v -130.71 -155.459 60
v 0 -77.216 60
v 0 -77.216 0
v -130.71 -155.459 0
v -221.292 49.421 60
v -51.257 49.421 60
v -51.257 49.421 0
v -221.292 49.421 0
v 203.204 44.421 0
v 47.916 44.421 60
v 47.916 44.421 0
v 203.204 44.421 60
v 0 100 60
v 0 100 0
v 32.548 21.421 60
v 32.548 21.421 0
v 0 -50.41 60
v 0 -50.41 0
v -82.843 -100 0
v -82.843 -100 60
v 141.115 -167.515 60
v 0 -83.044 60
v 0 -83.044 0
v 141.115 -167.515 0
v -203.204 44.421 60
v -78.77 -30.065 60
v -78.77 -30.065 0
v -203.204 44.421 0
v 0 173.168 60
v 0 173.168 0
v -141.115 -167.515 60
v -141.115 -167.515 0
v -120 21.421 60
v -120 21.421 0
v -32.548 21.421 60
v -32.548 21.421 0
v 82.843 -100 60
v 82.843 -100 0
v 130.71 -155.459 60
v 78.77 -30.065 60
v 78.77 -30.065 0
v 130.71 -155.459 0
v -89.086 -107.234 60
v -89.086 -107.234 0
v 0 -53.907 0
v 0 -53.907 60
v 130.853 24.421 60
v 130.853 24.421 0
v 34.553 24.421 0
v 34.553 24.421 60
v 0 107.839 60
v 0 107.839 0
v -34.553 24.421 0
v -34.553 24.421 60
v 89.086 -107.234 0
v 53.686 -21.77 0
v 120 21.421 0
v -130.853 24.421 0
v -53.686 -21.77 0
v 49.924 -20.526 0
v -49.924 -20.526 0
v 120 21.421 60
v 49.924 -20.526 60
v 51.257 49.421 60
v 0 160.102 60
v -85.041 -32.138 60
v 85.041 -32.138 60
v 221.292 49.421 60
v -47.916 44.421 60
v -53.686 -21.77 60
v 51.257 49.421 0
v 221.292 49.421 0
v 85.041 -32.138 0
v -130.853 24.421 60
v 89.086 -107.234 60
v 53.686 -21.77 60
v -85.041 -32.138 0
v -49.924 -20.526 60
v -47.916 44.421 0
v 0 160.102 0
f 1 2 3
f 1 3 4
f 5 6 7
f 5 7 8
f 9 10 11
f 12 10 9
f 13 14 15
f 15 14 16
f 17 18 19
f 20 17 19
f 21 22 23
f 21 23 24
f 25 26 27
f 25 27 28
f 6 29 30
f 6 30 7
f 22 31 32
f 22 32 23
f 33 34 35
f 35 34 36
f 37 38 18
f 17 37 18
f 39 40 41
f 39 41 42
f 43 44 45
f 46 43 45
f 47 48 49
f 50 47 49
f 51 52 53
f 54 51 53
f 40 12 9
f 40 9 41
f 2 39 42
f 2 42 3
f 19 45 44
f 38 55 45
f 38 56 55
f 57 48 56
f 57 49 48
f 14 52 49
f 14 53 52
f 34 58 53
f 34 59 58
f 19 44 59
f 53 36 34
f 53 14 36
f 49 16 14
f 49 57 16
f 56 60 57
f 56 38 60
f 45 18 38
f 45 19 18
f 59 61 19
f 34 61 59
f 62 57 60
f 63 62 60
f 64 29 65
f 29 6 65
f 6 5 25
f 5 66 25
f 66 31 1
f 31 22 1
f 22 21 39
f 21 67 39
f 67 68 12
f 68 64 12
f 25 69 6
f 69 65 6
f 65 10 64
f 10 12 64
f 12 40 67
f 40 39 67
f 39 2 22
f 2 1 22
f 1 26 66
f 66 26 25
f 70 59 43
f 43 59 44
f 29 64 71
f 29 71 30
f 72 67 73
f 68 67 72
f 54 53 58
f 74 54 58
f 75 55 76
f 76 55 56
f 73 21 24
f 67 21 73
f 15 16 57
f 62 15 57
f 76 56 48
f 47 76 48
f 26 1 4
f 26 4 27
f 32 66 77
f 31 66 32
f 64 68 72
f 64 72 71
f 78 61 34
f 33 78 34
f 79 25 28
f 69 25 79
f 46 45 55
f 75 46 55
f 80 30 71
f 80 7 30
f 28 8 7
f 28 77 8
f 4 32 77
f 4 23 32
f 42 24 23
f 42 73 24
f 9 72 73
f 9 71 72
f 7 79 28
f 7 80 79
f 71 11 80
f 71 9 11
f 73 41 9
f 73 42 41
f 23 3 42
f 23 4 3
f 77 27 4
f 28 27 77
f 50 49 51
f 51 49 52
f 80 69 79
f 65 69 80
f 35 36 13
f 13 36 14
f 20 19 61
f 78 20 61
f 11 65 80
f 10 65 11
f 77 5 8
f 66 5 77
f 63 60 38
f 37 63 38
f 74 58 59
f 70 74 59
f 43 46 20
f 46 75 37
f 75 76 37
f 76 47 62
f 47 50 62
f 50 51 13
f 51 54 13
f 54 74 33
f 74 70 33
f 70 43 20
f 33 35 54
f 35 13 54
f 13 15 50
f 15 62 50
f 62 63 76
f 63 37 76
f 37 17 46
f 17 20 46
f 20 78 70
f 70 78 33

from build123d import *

# Parameters (mm, degrees)
F1_DEPTH = 60
F3_DEPTH = 60


with BuildPart() as f1:
    # F0 (on Top) → F1 (new body)
    with BuildSketch(Plane.XY):
        Polygon((-89.086217, -107.233766), (0, -53.906885), (89.086217, -107.233766), (53.686146, -21.770435), (130.852711, 24.421359), (34.552878, 24.421359), (0, 107.839386), (-34.552878, 24.421359), (-130.852711, 24.421359), (-53.686146, -21.770435), align=None)
        Polygon((-32.54834, 21.421356), (0, 100), (32.54834, 21.421356), (120, 21.421356), (49.923615, -20.526267), (82.842712, -100), (0, -50.410471), (-82.842712, -100), (-49.923615, -20.526267), (-120, 21.421356), align=None, mode=Mode.SUBTRACT)
    extrude(amount=F1_DEPTH)


with BuildPart() as f3:
    # F2 (on face) → F3 (new body)
    with BuildSketch(Plane.XY.offset(60)):
        Polygon((51.257343, 49.421357), (0, 173.167529), (-51.257343, 49.421357), (-221.29186, 49.421357), (-85.040537, -32.138489), (-141.115358, -167.515082), (0, -83.043632), (141.115358, -167.515082), (85.040537, -32.138489), (221.29186, 49.421357), align=None)
        Polygon((-47.916449, 44.421357), (0, 160.101899), (47.916449, 44.421357), (203.204028, 44.421357), (78.769658, -30.064878), (130.709529, -155.458818), (0, -77.216282), (-130.709529, -155.458818), (-78.769658, -30.064878), (-203.204028, 44.421357), align=None, mode=Mode.SUBTRACT)
    extrude(amount=-F3_DEPTH)


solid = Compound([f1.part, f3.part])
